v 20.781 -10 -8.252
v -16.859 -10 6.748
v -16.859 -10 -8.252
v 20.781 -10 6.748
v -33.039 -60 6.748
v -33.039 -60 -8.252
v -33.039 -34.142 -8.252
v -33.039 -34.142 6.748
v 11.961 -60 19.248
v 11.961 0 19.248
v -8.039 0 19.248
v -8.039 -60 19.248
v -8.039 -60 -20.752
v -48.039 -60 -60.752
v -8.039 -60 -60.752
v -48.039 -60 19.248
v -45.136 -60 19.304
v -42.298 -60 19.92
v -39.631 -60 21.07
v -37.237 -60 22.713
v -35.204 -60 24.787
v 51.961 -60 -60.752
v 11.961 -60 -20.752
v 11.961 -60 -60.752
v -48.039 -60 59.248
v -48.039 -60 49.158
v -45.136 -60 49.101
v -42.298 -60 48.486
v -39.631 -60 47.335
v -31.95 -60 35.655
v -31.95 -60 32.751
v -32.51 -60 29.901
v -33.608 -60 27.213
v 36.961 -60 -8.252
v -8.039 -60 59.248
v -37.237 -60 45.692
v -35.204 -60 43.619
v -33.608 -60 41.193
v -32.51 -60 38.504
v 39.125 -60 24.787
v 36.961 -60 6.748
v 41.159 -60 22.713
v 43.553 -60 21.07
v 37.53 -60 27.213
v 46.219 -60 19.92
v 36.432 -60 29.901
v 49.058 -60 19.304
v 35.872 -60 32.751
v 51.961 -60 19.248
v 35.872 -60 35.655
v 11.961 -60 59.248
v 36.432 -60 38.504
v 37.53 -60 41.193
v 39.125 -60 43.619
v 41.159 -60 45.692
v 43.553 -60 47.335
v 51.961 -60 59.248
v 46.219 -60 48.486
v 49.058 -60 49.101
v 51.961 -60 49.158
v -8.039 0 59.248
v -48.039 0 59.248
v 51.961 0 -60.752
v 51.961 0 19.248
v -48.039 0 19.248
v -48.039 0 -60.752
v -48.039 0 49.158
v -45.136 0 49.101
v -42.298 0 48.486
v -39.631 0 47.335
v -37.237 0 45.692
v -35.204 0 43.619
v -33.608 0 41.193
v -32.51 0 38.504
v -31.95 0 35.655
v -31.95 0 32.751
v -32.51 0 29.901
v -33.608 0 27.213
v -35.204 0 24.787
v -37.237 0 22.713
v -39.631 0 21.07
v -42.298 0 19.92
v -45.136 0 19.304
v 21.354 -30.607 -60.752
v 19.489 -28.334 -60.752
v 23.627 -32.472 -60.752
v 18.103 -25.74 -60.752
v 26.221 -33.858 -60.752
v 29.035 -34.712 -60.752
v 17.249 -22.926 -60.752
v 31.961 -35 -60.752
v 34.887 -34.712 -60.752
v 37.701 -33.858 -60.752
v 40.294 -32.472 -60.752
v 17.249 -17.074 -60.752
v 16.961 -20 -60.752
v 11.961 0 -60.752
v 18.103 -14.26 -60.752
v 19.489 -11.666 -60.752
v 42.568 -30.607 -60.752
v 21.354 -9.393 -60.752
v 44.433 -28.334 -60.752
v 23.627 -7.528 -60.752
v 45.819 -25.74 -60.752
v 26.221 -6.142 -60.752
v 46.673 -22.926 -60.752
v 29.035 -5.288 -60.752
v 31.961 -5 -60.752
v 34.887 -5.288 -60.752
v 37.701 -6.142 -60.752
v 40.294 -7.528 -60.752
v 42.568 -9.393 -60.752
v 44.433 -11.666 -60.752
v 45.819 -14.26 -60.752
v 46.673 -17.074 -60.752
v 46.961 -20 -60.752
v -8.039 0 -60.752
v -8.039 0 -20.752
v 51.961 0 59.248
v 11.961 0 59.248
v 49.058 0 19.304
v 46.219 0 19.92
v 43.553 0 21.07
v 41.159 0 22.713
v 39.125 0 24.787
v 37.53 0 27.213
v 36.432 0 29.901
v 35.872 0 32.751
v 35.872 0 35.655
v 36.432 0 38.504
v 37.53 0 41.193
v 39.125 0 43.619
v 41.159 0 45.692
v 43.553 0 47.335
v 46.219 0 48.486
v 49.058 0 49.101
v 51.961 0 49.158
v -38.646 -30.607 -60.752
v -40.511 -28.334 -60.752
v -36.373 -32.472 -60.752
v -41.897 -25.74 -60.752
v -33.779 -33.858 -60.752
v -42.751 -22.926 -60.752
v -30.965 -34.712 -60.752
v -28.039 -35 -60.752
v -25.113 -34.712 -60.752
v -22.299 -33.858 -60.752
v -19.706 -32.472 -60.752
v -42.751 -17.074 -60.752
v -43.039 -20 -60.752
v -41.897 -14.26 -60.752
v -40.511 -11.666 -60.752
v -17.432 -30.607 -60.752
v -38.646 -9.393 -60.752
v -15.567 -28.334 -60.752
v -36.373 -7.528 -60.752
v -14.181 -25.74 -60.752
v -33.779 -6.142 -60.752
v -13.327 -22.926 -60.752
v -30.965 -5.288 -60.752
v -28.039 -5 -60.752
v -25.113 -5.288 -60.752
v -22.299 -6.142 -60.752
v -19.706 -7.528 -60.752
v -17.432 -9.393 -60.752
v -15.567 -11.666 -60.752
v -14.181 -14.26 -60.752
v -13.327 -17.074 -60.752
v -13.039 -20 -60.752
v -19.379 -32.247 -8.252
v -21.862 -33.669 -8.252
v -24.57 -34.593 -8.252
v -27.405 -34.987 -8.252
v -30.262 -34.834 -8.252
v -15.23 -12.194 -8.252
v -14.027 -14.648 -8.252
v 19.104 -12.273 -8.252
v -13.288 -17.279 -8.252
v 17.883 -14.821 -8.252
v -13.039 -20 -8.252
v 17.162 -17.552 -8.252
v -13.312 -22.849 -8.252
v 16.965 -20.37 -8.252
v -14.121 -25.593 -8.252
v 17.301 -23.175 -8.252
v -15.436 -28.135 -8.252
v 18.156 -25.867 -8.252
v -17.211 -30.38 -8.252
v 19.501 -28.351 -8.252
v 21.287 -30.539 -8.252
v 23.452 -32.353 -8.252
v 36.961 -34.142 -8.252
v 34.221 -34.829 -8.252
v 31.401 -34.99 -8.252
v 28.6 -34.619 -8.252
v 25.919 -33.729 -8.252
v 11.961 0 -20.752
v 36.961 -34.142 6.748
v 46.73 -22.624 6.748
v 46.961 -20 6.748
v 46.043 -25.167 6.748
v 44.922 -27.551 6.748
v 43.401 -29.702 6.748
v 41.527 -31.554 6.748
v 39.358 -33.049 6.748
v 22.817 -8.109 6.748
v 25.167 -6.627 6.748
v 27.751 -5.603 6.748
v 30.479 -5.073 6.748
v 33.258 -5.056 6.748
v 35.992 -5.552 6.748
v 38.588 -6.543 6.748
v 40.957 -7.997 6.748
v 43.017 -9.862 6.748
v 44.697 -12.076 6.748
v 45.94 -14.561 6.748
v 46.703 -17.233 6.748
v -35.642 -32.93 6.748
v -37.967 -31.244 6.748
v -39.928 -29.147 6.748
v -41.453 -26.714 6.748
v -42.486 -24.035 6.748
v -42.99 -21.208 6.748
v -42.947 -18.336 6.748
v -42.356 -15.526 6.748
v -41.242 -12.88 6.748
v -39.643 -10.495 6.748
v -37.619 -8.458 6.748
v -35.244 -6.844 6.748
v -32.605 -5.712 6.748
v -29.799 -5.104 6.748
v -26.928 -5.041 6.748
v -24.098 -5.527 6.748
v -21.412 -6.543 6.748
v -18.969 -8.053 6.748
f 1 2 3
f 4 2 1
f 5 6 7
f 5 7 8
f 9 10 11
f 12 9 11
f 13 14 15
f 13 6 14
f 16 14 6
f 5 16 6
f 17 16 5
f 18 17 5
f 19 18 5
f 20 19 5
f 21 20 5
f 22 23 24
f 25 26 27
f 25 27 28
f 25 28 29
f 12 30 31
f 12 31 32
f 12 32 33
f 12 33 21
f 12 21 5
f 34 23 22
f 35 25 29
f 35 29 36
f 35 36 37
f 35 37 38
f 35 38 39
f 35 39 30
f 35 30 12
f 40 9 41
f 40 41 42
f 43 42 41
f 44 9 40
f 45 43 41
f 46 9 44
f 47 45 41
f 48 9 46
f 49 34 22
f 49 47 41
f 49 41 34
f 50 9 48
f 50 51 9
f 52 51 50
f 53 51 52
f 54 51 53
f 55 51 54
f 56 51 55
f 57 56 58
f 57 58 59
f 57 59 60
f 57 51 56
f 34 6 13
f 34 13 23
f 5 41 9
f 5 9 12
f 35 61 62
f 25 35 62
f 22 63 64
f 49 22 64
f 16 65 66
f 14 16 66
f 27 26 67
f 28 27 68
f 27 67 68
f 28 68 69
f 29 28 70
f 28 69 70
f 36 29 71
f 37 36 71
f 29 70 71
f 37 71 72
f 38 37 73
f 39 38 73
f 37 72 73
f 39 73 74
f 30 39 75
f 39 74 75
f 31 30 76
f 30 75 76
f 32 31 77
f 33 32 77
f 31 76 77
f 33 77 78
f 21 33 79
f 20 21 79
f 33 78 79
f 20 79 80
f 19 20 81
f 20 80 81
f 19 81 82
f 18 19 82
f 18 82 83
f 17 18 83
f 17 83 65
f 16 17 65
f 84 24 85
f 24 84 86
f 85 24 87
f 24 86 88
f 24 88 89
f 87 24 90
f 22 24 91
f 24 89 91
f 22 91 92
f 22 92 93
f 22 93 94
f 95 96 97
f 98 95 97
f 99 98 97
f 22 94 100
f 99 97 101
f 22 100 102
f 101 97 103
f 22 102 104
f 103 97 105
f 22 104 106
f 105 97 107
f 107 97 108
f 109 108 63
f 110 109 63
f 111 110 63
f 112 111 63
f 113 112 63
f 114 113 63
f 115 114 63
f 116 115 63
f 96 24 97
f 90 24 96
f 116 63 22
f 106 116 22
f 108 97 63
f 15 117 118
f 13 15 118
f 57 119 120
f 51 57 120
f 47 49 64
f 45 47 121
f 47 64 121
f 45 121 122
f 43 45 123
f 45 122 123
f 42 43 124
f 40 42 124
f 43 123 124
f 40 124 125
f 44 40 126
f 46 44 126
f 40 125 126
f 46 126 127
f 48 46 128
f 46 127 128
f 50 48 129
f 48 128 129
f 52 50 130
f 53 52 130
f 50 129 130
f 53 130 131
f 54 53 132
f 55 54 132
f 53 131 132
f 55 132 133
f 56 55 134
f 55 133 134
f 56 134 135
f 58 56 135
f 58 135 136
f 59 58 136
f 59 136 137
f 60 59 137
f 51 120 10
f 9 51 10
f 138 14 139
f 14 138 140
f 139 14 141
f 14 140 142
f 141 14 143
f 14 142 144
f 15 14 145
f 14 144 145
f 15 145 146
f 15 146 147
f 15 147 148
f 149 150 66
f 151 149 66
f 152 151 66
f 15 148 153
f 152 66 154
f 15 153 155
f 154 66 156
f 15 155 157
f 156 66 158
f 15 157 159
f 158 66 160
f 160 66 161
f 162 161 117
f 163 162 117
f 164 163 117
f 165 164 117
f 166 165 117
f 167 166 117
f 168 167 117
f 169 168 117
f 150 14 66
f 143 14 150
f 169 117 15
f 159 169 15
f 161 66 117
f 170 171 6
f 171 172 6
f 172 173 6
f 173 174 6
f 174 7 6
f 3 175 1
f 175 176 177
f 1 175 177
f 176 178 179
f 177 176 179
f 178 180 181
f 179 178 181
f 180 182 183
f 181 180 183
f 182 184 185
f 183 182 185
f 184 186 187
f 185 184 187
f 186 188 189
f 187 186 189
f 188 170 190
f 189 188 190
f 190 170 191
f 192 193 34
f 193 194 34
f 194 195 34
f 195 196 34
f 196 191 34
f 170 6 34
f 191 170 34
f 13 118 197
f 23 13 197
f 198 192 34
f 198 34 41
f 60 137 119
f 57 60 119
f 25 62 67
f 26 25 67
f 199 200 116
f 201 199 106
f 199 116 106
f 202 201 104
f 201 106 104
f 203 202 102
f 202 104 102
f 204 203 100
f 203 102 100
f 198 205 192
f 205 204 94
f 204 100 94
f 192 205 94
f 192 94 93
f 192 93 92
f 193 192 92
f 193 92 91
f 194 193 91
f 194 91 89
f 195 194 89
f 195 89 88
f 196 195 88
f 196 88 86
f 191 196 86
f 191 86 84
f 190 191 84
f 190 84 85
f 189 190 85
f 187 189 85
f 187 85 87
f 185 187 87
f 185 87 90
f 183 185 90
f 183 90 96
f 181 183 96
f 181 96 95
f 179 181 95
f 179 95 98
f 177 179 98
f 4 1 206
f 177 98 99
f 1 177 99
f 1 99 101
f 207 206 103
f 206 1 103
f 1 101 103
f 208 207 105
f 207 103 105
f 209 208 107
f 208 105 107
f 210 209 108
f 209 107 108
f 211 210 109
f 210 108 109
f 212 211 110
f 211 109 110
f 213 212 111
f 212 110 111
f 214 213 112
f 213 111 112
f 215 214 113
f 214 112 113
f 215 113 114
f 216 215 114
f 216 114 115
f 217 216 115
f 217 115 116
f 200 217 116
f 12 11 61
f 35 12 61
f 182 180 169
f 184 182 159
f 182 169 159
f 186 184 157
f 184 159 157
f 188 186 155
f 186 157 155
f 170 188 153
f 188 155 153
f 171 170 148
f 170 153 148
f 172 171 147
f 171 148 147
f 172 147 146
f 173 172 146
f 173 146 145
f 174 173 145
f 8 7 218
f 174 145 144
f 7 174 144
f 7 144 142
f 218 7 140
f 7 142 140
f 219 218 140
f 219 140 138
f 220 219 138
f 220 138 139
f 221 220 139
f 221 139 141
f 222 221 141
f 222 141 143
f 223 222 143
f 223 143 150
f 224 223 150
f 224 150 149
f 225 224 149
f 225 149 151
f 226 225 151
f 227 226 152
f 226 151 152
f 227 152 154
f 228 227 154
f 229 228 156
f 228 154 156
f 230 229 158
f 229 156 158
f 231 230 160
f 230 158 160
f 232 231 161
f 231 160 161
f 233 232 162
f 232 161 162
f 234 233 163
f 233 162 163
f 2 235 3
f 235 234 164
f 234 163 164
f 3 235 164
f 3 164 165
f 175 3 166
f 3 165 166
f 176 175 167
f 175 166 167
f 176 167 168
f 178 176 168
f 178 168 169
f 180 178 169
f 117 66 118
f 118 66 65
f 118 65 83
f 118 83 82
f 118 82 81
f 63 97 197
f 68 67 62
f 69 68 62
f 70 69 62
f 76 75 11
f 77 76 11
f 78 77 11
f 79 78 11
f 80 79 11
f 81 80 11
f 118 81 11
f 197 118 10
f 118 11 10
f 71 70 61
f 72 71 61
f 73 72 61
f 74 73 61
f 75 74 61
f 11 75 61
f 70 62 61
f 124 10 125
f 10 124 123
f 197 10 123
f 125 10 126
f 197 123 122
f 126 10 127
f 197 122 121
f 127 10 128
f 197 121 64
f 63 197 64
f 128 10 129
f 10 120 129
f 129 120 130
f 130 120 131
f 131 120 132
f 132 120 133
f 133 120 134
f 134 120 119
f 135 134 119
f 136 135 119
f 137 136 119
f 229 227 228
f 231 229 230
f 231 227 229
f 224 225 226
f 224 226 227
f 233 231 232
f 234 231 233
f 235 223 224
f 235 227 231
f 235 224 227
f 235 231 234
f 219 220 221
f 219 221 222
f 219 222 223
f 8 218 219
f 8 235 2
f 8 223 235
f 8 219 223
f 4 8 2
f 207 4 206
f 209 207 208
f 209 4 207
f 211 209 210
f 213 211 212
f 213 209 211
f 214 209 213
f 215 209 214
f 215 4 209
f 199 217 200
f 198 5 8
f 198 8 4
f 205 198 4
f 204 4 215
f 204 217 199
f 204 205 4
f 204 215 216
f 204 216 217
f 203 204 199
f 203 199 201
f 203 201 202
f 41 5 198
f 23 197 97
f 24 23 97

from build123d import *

# Parameters (mm, degrees)
F1_DEPTH = 60
F2_W     = 70
F2_H     = 15
F3_DEPTH = 50
F4_R     = 15
F5_R     = 15
F6_DEPTH = 67.5


with BuildPart() as f1:
    # F0 (on Front) → F1 (new body)
    with BuildSketch(Plane.XZ):
        with BuildLine():
            Line((-8.039089, 59.247605), (-48.039089, 59.247605))
            Line((-48.039089, 59.247605), (-48.039089, 49.157878))
            ThreePointArc((-48.039089, 49.157878), (-31.879825, 34.202742), (-48.039089, 19.247605))
            Line((-48.039089, 19.247605), (-48.039089, -60.752395))
            Line((-48.039089, -60.752395), (-8.039089, -60.752395))
            Line((-8.039089, -60.752395), (-8.039089, -20.752395))
            Line((-8.039089, -20.752395), (11.960911, -20.752395))
            Line((11.960911, -20.752395), (11.960911, -60.752395))
            Line((11.960911, -60.752395), (51.960911, -60.752395))
            Line((51.960911, -60.752395), (51.960911, 19.247605))
            ThreePointArc((51.960911, 19.247605), (35.801647, 34.202742), (51.960911, 49.157878))
            Line((51.960911, 49.157878), (51.960911, 59.247605))
            Line((51.960911, 59.247605), (11.960911, 59.247605))
            Line((11.960911, 59.247605), (11.960911, 19.247605))
            Line((11.960911, 19.247605), (-8.039089, 19.247605))
            Line((-8.039089, 19.247605), (-8.039089, 59.247605))
        make_face()
    extrude(amount=F1_DEPTH)

    # F2 (on face) → F3 (cut)
    with BuildSketch(Plane.XZ.offset(60)):
        with Locations((1.960911, -0.752395)):
            Rectangle(F2_W, F2_H)
    extrude(amount=-F3_DEPTH, mode=Mode.SUBTRACT)

    # F4 (on face) + F5 (on face) → F6 (cut)
    with BuildSketch(Plane(origin=(0, 0, -60.752395), x_dir=(1, 0, 0), z_dir=(0, 0, -1))):
        with Locations((-28.039089, 20)):
            Circle(F4_R)
    with BuildSketch(Plane(origin=(0, 0, -60.752395), x_dir=(1, 0, 0), z_dir=(0, 0, -1))):
        with Locations((31.960911, 20)):
            Circle(F5_R)
    extrude(amount=-F6_DEPTH, mode=Mode.SUBTRACT)


solid = f1.part
